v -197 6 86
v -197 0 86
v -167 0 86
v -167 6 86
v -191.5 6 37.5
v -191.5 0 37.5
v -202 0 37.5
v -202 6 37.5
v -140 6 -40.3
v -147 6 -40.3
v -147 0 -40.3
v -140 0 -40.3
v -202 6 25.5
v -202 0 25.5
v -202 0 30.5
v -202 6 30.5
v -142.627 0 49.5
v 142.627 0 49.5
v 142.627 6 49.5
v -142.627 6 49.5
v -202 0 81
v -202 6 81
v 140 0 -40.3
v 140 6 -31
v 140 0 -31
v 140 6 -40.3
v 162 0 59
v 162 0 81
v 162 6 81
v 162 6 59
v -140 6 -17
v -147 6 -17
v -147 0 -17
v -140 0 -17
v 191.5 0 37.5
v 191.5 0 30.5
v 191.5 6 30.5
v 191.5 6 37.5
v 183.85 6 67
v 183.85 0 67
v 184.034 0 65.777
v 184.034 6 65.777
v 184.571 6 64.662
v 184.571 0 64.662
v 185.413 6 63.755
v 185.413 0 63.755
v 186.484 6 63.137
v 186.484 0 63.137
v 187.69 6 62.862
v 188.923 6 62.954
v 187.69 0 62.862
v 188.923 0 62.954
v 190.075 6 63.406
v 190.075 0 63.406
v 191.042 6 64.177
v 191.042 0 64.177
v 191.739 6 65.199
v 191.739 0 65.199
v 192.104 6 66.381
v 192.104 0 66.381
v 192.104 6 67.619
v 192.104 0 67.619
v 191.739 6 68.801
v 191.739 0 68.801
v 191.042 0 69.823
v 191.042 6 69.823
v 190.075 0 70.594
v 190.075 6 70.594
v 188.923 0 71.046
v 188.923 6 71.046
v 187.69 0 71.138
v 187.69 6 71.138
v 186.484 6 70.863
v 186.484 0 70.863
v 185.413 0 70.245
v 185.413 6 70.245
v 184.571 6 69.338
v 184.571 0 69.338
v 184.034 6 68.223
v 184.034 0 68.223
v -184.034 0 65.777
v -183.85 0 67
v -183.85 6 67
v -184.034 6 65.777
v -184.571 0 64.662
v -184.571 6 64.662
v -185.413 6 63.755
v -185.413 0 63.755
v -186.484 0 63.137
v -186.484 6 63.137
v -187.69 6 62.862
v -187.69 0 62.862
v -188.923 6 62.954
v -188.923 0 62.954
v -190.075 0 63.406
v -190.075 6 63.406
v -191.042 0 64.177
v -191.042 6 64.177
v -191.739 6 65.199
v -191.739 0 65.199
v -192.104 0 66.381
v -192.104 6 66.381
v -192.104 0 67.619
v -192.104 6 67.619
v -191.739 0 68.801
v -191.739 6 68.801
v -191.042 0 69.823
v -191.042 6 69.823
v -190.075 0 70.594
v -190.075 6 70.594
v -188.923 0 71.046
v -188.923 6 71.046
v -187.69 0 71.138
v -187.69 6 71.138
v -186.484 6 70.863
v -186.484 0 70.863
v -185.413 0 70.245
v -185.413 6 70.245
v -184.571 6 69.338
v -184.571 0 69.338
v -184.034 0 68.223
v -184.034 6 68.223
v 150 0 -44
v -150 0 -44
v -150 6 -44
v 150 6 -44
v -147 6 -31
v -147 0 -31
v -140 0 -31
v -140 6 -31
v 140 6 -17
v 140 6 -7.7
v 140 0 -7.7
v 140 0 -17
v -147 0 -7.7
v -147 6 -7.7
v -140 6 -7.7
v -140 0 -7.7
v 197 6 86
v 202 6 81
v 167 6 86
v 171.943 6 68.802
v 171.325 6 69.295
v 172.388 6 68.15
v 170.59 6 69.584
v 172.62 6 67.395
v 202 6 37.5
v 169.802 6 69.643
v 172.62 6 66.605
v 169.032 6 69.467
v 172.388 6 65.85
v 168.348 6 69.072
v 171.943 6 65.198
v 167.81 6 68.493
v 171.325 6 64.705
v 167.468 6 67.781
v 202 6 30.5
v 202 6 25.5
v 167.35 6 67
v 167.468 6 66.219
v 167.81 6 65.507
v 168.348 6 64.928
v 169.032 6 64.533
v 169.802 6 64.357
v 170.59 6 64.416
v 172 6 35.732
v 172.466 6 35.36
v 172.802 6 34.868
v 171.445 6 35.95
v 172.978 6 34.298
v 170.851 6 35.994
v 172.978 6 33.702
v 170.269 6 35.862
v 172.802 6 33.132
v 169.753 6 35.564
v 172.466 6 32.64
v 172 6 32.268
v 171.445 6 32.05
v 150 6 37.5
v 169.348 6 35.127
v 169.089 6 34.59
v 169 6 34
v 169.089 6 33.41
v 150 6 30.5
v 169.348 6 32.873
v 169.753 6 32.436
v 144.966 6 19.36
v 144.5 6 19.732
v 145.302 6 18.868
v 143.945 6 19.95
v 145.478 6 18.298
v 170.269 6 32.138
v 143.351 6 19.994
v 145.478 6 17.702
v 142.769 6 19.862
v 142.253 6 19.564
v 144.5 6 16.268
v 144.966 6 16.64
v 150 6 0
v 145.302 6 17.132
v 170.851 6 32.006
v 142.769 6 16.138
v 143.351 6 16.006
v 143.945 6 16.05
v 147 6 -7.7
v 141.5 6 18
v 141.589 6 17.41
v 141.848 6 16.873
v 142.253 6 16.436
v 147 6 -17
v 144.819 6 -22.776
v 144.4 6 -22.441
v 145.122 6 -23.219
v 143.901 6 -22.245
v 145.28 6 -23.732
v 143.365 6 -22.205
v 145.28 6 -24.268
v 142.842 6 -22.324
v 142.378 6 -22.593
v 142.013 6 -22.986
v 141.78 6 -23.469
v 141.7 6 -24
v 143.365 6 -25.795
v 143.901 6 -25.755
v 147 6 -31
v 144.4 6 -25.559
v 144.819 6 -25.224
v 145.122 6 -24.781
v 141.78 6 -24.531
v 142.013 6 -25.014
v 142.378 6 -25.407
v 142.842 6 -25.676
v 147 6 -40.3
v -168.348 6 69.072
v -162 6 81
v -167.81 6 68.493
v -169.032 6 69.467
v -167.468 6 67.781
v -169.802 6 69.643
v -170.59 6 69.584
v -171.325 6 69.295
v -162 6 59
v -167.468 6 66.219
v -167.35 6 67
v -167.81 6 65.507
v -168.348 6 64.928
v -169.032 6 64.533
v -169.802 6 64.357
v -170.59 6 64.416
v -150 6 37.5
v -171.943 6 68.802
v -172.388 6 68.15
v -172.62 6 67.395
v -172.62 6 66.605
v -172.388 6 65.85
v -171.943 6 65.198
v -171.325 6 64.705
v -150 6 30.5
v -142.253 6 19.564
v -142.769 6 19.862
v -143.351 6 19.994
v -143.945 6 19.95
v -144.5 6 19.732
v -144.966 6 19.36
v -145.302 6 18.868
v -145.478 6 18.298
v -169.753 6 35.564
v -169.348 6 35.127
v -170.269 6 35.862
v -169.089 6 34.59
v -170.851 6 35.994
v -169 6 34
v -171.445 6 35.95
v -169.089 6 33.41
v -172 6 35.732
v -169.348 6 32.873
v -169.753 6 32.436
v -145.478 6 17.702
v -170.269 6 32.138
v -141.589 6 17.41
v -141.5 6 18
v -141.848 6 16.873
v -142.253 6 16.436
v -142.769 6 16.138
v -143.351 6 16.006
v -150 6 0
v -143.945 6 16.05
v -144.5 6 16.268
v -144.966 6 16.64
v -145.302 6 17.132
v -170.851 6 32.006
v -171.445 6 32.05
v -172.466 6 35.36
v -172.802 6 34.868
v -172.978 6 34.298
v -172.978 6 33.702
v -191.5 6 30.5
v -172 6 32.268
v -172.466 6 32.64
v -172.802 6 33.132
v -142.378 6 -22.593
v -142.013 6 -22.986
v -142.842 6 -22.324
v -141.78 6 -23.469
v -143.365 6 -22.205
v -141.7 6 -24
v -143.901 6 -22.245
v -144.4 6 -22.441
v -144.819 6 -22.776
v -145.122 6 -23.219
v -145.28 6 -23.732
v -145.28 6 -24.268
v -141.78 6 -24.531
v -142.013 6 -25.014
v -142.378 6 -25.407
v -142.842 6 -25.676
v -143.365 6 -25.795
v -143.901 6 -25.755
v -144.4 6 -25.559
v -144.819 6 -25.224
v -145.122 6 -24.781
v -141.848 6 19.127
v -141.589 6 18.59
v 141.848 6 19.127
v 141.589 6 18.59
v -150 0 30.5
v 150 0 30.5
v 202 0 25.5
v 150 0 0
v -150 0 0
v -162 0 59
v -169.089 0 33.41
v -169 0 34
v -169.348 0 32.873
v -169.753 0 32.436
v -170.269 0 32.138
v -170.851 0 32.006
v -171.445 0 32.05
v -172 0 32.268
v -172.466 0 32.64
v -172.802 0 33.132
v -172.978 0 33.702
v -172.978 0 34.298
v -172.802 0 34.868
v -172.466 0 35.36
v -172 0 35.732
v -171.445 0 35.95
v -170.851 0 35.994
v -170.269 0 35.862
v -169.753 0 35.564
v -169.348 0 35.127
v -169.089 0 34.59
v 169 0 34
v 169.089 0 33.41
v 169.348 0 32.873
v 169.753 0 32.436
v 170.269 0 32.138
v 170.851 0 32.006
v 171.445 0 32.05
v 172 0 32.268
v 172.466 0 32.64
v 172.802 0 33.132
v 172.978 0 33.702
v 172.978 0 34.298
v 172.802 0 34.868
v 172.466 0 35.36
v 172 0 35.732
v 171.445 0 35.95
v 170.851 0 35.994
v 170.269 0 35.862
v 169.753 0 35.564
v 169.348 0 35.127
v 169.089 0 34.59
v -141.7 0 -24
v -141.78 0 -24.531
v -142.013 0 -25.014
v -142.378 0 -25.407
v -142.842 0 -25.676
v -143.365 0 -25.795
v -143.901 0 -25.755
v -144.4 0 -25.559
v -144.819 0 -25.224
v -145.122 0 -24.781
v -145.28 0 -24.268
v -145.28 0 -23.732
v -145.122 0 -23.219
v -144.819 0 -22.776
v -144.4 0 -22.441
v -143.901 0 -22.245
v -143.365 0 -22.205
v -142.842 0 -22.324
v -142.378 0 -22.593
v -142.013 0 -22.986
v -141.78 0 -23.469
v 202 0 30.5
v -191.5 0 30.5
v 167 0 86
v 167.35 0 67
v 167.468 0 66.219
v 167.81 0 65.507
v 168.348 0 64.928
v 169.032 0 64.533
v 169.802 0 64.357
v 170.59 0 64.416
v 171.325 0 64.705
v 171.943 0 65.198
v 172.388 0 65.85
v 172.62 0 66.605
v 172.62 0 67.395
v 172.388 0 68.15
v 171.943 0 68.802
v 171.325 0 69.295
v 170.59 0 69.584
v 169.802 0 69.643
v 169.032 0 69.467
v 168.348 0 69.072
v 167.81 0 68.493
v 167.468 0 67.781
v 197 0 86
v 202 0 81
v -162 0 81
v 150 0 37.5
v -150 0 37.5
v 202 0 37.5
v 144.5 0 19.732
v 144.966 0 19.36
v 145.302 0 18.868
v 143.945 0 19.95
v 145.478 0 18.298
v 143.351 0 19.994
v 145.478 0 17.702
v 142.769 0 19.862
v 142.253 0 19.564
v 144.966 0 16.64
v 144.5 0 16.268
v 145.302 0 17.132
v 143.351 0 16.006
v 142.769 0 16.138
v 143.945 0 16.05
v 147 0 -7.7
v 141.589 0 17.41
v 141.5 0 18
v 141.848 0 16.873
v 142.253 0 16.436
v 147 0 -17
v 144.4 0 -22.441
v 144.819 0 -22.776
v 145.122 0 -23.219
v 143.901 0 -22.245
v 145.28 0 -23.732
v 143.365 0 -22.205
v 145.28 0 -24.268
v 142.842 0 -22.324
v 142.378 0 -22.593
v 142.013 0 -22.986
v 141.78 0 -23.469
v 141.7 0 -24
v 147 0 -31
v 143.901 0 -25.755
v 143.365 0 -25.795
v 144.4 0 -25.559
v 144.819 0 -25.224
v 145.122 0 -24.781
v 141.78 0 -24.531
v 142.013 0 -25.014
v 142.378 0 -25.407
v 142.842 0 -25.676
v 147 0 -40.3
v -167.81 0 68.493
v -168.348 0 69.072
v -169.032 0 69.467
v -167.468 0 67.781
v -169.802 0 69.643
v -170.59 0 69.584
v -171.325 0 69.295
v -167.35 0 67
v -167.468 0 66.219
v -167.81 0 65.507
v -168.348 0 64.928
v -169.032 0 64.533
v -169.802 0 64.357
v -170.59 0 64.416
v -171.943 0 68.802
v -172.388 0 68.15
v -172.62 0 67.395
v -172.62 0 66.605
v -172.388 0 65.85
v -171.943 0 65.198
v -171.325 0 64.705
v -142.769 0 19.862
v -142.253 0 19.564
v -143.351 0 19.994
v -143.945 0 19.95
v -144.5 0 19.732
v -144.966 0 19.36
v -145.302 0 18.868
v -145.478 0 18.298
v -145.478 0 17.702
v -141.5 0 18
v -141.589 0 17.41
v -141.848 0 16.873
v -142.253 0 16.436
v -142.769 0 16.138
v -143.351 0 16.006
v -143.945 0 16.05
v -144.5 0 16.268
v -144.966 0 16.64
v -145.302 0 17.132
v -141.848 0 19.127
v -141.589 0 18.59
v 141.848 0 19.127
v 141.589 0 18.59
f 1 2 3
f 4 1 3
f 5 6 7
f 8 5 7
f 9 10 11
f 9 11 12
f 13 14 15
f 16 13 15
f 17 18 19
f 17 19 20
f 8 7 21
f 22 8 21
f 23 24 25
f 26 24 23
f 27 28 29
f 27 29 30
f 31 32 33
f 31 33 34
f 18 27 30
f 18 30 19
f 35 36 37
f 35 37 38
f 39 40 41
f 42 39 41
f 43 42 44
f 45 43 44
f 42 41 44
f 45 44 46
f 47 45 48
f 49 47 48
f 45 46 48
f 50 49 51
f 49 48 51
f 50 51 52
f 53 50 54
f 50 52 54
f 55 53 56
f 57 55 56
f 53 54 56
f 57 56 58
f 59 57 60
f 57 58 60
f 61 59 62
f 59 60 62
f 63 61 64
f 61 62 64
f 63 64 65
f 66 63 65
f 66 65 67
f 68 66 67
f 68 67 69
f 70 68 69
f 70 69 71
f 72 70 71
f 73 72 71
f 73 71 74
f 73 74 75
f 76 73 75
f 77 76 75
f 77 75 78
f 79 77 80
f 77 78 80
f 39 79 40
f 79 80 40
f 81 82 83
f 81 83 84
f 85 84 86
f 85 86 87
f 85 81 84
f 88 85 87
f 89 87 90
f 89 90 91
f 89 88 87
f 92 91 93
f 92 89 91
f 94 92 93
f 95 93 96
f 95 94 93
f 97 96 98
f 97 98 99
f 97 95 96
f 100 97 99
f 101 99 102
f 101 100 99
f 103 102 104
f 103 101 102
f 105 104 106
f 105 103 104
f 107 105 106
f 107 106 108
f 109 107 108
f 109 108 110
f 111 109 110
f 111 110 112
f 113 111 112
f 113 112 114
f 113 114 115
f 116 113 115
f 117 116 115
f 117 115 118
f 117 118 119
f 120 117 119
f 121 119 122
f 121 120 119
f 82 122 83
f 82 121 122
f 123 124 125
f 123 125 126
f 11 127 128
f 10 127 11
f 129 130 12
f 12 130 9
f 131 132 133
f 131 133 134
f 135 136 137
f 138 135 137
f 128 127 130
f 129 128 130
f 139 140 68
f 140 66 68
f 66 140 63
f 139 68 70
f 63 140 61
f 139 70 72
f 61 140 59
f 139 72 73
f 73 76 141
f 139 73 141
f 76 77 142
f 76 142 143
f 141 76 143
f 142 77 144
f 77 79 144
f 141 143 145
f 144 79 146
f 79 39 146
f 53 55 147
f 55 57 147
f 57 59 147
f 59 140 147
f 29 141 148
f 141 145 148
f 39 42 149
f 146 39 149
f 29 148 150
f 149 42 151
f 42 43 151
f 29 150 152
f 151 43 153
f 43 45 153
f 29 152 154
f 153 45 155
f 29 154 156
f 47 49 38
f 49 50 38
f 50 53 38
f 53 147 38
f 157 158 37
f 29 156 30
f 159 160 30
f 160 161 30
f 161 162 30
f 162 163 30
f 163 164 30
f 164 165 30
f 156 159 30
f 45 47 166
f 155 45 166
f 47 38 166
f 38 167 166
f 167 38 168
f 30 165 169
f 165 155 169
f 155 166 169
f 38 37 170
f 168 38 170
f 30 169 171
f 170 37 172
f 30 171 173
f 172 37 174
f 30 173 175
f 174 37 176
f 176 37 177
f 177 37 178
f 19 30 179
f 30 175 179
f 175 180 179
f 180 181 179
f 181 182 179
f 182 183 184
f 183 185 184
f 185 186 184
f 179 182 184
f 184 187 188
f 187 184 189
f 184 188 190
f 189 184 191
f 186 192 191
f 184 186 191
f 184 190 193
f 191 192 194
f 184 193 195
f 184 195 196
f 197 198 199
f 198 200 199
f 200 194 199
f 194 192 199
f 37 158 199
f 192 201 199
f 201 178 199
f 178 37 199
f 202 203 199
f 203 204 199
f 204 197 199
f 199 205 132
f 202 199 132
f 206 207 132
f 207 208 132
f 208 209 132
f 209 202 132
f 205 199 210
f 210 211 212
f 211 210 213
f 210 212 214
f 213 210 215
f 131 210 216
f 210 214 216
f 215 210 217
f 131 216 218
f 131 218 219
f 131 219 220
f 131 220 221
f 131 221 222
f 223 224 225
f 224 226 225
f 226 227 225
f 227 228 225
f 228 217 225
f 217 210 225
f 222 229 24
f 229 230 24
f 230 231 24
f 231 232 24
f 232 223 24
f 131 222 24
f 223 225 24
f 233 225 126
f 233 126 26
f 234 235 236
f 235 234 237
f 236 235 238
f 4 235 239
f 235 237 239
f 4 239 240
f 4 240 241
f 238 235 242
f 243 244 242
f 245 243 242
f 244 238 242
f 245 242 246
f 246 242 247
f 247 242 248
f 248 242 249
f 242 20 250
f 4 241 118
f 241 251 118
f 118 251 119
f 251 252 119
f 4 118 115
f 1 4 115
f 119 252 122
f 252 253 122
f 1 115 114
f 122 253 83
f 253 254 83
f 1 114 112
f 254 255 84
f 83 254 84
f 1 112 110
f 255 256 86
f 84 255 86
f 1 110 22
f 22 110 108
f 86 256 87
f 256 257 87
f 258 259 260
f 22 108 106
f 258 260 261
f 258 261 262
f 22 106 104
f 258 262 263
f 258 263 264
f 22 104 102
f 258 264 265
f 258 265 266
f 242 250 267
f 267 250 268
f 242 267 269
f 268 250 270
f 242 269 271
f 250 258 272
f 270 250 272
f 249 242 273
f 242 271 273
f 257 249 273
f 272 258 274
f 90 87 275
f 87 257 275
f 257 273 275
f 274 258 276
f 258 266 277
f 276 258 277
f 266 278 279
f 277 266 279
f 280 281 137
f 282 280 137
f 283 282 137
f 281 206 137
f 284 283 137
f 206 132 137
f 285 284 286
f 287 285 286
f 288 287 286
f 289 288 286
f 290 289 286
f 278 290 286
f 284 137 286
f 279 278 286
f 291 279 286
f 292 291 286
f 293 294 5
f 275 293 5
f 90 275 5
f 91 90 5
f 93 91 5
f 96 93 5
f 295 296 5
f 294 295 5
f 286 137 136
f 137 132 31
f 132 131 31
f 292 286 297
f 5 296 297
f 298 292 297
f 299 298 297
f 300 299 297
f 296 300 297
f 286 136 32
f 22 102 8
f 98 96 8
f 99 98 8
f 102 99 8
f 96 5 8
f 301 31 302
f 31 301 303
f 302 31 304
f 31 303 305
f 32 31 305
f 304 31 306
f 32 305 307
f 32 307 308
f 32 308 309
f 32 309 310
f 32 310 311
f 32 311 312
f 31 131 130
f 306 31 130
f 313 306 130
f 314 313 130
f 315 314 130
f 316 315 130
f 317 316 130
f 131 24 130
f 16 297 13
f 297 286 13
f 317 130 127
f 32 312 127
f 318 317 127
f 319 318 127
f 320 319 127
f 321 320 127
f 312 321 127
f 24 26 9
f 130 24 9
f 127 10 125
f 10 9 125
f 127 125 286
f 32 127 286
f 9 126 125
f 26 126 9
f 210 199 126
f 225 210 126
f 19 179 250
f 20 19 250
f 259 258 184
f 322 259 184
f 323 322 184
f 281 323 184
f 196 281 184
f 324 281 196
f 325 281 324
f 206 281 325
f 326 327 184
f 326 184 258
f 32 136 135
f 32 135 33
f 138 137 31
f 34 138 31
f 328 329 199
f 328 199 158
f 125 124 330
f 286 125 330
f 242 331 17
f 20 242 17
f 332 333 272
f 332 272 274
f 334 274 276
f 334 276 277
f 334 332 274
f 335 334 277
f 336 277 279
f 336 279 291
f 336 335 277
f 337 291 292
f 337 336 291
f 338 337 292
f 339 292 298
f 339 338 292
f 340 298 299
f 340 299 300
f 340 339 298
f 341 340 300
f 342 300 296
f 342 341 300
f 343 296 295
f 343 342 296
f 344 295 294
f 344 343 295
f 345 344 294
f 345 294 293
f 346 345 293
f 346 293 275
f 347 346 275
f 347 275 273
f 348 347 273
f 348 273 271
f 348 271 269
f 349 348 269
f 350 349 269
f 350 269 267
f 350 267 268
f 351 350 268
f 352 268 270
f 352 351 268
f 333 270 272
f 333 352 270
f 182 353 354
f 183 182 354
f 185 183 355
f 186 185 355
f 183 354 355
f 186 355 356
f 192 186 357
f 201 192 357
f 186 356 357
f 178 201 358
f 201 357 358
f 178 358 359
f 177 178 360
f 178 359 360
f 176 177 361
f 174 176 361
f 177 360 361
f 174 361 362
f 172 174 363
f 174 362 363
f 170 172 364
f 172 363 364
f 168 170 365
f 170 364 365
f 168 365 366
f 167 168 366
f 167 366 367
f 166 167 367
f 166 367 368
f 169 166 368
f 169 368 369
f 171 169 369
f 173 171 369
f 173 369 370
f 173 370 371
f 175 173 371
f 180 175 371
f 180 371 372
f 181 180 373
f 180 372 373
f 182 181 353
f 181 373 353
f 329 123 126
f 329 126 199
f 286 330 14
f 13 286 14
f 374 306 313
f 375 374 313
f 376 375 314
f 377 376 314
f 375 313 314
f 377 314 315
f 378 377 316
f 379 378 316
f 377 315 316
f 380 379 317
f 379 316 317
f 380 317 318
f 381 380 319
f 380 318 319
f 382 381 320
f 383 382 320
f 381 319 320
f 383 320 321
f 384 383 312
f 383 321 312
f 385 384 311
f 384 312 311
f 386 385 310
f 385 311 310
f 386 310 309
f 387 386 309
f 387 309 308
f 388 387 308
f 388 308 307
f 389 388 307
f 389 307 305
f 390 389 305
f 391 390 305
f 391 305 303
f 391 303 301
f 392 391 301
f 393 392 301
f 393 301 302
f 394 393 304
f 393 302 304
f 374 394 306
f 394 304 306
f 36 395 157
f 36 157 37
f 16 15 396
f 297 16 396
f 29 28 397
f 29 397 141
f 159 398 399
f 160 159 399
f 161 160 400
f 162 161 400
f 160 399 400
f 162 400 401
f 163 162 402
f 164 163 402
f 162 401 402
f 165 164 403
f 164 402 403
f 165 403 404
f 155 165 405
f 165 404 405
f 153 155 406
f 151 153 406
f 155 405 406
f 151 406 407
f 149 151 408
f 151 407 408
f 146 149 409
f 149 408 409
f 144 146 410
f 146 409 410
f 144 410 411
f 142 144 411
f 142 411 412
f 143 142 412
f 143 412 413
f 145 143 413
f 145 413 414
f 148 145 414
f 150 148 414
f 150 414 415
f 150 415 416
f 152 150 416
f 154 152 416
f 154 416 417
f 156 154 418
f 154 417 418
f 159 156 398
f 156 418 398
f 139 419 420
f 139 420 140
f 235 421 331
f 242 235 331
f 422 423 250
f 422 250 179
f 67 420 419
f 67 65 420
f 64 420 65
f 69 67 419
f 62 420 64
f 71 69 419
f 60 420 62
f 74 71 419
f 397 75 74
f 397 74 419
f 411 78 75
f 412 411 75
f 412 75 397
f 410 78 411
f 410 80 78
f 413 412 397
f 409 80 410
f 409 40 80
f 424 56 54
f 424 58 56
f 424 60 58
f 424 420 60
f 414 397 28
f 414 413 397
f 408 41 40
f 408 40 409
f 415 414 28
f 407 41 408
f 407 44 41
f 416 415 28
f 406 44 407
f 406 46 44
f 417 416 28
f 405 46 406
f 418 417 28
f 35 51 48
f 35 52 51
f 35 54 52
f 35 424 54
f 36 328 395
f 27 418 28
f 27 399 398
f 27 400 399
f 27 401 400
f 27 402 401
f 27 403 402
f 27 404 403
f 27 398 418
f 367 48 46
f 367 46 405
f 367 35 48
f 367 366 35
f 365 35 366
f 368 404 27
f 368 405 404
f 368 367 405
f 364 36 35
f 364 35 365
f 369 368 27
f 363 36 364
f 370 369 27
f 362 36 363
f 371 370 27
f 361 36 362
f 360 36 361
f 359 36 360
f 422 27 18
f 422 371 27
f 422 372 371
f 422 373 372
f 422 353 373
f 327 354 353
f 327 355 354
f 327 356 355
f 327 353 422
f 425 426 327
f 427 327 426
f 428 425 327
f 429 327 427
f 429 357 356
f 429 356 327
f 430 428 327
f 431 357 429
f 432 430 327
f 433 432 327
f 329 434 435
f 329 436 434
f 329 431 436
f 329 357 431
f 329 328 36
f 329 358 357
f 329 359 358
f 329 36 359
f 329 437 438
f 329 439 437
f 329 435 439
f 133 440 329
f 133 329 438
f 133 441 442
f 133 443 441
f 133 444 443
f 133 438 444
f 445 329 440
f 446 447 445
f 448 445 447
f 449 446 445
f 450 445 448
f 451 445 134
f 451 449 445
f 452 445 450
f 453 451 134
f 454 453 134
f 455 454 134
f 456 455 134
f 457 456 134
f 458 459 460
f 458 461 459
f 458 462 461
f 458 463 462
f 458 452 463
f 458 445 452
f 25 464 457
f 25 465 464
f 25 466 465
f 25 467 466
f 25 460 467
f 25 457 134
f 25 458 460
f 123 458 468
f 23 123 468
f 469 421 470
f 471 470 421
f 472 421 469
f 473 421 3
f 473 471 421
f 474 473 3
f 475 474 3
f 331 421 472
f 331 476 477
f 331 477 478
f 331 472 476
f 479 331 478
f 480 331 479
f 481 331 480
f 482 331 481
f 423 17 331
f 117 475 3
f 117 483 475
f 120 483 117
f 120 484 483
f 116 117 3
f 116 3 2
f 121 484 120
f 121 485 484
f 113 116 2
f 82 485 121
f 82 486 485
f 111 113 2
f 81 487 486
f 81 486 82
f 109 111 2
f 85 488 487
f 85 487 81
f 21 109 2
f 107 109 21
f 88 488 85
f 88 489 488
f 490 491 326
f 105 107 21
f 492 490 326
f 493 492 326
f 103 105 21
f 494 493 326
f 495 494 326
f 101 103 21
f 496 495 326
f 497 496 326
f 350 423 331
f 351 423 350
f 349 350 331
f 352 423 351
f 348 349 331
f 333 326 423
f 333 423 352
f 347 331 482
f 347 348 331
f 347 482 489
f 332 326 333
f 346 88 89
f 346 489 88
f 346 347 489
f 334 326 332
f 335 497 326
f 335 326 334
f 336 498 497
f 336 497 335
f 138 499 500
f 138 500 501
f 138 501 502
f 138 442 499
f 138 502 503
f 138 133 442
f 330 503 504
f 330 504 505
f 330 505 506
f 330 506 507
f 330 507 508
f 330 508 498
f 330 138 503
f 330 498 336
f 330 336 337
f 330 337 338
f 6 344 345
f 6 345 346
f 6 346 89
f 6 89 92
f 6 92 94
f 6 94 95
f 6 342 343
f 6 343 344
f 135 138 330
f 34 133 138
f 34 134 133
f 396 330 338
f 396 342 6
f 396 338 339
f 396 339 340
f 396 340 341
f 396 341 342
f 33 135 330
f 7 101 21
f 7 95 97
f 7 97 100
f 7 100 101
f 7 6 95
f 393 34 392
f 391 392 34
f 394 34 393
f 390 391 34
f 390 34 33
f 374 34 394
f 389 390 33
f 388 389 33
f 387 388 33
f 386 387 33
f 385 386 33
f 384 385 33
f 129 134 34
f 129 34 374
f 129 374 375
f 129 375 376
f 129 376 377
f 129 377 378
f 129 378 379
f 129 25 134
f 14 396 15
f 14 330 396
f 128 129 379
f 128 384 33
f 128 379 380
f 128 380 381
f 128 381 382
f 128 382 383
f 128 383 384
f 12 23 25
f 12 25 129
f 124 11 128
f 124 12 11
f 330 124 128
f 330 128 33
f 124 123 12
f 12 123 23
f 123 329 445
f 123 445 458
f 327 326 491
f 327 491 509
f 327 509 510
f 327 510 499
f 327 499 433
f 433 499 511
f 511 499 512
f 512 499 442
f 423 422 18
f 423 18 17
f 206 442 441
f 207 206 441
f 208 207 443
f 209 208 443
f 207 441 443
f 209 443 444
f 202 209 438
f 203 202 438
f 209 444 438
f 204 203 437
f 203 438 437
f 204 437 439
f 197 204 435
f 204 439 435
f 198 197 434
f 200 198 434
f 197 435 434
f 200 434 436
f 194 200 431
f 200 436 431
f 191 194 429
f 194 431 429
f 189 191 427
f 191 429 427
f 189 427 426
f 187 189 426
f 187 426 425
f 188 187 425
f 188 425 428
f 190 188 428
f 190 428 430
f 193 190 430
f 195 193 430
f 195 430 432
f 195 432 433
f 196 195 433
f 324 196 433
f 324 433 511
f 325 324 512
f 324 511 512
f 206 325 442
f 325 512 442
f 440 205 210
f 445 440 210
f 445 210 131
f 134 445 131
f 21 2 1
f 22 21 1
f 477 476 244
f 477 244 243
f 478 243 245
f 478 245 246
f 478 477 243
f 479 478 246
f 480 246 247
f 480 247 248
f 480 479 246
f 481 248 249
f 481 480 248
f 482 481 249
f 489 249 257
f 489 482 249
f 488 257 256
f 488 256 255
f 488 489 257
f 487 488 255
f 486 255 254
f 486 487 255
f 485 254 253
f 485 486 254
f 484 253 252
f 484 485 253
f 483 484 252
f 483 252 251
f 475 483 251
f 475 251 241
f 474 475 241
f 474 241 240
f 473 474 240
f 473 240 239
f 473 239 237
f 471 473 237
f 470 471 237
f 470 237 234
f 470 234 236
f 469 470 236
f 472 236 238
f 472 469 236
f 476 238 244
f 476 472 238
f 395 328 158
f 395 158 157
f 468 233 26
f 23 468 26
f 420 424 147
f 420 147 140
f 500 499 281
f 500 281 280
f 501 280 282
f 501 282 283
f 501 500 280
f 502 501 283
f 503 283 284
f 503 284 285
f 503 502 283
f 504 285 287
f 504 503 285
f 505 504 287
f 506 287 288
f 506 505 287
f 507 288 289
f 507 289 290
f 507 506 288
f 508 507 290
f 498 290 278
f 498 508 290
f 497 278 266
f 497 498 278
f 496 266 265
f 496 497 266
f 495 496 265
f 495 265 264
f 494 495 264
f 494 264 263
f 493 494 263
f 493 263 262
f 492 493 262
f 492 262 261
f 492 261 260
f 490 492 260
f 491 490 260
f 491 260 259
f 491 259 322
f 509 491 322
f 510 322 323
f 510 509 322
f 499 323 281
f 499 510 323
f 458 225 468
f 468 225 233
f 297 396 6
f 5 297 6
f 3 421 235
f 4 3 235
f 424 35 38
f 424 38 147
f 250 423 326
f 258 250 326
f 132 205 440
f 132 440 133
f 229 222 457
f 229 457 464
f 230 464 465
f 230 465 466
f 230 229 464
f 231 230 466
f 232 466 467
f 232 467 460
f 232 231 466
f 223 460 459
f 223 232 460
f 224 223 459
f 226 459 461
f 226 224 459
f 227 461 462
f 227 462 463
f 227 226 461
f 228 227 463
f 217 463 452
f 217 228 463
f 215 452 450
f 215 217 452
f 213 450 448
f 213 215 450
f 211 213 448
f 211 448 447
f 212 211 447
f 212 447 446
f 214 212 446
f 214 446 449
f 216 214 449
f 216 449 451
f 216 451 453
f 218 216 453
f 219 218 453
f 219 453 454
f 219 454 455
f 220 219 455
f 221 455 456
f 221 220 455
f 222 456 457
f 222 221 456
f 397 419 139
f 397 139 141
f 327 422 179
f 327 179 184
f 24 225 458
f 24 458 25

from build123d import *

# Parameters (mm, degrees)
ESQUISSE1_R             = 4.15
ESQUISSE1_R_2           = 2
ESQUISSE1_R_3           = 2.65
BOSS_EXTRU_1_DEPTH      = 6
CHANFREIN1_SIZE         = 5
ESQUISSE3_R             = 1.8
ESQUISSE3_W             = 7
ESQUISSE3_H             = 9.3
ENL_V_MAT_EXTRU_1_DEPTH = 6


with BuildPart() as part:
    # Esquisse1 → Boss.-Extru.1 (new body)
    with BuildSketch(Plane(origin=(0, 0, 0), x_dir=(1, 0, 0), z_dir=(0, 1, 0))):
        Polygon((-150, 0), (-202, -25.5), (-202, -30.5), (-191.5, -30.5), (-191.5, -37.5), (-202, -37.5), (-202, -86), (-162, -86), (-162, -59), (-142.62745098, -49.5), (0, -49.5), (0, -37.5), (-150, -37.5), (-150, -30.5), (0, -30.5), (0, 0), (0, 44), (-150, 44), align=None)
        with Locations((-188, -67)):
            Circle(ESQUISSE1_R, mode=Mode.SUBTRACT)
        with Locations((-171, -34)):
            Circle(ESQUISSE1_R_2, mode=Mode.SUBTRACT)
        with Locations((-170, -67)):
            Circle(ESQUISSE1_R_3, mode=Mode.SUBTRACT)
        with Locations((-143.5, -18)):
            Circle(ESQUISSE1_R_2, mode=Mode.SUBTRACT)
    extrude(amount=BOSS_EXTRU_1_DEPTH)

    # Chanfrein1
    chanfrein1_edges = [part.edges().sort_by_distance(p)[0] for p in [
        (-162, 3, 86),
        (-202, 3, 86),
    ]]
    chamfer(chanfrein1_edges, length=CHANFREIN1_SIZE)

    # Esquisse3 → Enlèv. mat.-Extru.1 (cut)
    with BuildSketch(Plane(origin=(0, 6, 0), x_dir=(1, 0, 0), z_dir=(0, 1, 0))):
        with Locations((-143.5, 24)):
            Circle(ESQUISSE3_R)
        with Locations((-143.5, 35.65)):
            Rectangle(ESQUISSE3_W, ESQUISSE3_H)
        with Locations((-143.5, 12.35)):
            Rectangle(ESQUISSE3_W, ESQUISSE3_H)
    extrude(amount=-ENL_V_MAT_EXTRU_1_DEPTH, mode=Mode.SUBTRACT)

    # Symétrie1: part across plane


with BuildPart() as part_1:
    add(part.part)
    add(part.part.mirror(Plane(origin=(0, 6, 30.5), x_dir=(0, 0, 1), z_dir=(-1, 0, 0))))


solid = part_1.part
